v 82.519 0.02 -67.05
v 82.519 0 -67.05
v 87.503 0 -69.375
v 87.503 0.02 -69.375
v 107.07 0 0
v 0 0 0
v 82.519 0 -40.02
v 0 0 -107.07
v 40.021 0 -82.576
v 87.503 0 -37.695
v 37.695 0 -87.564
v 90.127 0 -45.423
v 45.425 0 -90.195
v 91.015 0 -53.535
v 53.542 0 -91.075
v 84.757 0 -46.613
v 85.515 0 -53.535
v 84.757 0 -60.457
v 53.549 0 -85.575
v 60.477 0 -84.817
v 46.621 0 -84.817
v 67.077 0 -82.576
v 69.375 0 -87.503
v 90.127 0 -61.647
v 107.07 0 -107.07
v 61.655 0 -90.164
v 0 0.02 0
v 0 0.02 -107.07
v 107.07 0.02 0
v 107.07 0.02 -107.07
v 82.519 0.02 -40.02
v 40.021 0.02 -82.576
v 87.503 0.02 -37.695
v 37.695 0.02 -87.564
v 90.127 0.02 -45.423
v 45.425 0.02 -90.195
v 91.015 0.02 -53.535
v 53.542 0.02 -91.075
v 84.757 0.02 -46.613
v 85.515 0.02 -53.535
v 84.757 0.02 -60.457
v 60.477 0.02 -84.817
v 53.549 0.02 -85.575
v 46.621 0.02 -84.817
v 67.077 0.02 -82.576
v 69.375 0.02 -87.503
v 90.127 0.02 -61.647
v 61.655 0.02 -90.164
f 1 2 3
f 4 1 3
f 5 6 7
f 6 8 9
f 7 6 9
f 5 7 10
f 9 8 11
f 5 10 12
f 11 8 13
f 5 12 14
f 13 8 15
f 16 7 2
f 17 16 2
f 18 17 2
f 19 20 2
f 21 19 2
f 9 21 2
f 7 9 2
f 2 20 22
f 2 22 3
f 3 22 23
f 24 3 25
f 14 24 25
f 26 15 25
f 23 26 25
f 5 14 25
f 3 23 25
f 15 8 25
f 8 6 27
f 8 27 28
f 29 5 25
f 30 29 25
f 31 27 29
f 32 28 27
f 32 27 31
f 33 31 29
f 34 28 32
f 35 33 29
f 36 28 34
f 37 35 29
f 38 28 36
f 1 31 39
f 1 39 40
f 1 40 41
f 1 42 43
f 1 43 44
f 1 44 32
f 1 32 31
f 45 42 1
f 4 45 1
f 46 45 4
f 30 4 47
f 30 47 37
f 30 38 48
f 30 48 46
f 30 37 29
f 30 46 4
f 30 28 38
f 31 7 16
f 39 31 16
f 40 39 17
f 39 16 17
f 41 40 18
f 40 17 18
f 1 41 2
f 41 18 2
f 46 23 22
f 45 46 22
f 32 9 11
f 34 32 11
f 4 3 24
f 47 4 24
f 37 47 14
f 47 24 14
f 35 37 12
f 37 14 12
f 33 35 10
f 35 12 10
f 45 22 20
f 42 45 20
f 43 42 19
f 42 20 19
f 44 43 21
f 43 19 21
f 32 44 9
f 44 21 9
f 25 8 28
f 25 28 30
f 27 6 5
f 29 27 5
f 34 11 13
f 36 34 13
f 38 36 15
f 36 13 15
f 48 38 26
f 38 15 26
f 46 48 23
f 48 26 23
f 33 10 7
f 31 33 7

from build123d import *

# Parameters (mm, degrees)
SKETCH1_W           = 107.07
SKETCH1_H           = 107.07
BOSS_EXTRUDE1_DEPTH = 0.02


with BuildPart() as part:
    # Sketch1 → Boss-Extrude1 (new body)
    with BuildSketch(Plane(origin=(0, 0, 0), x_dir=(1, 0, 0), z_dir=(0, 1, 0))):
        with Locations((53.535, 53.535)):
            Rectangle(SKETCH1_W, SKETCH1_H)
        with BuildLine():
            Line((40.02098899, 82.576362505), (37.69526755, 87.563888229))
            ThreePointArc((37.69526755, 87.563888229), (53.541760789, 91.075404612), (69.37473245, 87.503415858))
            Line((69.37473245, 87.503415858), (67.077209739, 82.576362505))
            ThreePointArc((67.077209739, 82.576362505), (53.549099365, 85.57547237), (40.02098899, 82.576362505))
        make_face(mode=Mode.SUBTRACT)
        with BuildLine():
            Line((82.518723029, 67.05033201), (87.503415858, 69.37473245))
            ThreePointArc((87.503415858, 69.37473245), (91.015, 53.535), (87.503415858, 37.69526755))
            Line((87.503415858, 37.69526755), (82.518723029, 40.01966799))
            ThreePointArc((82.518723029, 40.01966799), (85.515, 53.535), (82.518723029, 67.05033201))
        make_face(mode=Mode.SUBTRACT)
    extrude(amount=BOSS_EXTRUDE1_DEPTH)


solid = part.part
